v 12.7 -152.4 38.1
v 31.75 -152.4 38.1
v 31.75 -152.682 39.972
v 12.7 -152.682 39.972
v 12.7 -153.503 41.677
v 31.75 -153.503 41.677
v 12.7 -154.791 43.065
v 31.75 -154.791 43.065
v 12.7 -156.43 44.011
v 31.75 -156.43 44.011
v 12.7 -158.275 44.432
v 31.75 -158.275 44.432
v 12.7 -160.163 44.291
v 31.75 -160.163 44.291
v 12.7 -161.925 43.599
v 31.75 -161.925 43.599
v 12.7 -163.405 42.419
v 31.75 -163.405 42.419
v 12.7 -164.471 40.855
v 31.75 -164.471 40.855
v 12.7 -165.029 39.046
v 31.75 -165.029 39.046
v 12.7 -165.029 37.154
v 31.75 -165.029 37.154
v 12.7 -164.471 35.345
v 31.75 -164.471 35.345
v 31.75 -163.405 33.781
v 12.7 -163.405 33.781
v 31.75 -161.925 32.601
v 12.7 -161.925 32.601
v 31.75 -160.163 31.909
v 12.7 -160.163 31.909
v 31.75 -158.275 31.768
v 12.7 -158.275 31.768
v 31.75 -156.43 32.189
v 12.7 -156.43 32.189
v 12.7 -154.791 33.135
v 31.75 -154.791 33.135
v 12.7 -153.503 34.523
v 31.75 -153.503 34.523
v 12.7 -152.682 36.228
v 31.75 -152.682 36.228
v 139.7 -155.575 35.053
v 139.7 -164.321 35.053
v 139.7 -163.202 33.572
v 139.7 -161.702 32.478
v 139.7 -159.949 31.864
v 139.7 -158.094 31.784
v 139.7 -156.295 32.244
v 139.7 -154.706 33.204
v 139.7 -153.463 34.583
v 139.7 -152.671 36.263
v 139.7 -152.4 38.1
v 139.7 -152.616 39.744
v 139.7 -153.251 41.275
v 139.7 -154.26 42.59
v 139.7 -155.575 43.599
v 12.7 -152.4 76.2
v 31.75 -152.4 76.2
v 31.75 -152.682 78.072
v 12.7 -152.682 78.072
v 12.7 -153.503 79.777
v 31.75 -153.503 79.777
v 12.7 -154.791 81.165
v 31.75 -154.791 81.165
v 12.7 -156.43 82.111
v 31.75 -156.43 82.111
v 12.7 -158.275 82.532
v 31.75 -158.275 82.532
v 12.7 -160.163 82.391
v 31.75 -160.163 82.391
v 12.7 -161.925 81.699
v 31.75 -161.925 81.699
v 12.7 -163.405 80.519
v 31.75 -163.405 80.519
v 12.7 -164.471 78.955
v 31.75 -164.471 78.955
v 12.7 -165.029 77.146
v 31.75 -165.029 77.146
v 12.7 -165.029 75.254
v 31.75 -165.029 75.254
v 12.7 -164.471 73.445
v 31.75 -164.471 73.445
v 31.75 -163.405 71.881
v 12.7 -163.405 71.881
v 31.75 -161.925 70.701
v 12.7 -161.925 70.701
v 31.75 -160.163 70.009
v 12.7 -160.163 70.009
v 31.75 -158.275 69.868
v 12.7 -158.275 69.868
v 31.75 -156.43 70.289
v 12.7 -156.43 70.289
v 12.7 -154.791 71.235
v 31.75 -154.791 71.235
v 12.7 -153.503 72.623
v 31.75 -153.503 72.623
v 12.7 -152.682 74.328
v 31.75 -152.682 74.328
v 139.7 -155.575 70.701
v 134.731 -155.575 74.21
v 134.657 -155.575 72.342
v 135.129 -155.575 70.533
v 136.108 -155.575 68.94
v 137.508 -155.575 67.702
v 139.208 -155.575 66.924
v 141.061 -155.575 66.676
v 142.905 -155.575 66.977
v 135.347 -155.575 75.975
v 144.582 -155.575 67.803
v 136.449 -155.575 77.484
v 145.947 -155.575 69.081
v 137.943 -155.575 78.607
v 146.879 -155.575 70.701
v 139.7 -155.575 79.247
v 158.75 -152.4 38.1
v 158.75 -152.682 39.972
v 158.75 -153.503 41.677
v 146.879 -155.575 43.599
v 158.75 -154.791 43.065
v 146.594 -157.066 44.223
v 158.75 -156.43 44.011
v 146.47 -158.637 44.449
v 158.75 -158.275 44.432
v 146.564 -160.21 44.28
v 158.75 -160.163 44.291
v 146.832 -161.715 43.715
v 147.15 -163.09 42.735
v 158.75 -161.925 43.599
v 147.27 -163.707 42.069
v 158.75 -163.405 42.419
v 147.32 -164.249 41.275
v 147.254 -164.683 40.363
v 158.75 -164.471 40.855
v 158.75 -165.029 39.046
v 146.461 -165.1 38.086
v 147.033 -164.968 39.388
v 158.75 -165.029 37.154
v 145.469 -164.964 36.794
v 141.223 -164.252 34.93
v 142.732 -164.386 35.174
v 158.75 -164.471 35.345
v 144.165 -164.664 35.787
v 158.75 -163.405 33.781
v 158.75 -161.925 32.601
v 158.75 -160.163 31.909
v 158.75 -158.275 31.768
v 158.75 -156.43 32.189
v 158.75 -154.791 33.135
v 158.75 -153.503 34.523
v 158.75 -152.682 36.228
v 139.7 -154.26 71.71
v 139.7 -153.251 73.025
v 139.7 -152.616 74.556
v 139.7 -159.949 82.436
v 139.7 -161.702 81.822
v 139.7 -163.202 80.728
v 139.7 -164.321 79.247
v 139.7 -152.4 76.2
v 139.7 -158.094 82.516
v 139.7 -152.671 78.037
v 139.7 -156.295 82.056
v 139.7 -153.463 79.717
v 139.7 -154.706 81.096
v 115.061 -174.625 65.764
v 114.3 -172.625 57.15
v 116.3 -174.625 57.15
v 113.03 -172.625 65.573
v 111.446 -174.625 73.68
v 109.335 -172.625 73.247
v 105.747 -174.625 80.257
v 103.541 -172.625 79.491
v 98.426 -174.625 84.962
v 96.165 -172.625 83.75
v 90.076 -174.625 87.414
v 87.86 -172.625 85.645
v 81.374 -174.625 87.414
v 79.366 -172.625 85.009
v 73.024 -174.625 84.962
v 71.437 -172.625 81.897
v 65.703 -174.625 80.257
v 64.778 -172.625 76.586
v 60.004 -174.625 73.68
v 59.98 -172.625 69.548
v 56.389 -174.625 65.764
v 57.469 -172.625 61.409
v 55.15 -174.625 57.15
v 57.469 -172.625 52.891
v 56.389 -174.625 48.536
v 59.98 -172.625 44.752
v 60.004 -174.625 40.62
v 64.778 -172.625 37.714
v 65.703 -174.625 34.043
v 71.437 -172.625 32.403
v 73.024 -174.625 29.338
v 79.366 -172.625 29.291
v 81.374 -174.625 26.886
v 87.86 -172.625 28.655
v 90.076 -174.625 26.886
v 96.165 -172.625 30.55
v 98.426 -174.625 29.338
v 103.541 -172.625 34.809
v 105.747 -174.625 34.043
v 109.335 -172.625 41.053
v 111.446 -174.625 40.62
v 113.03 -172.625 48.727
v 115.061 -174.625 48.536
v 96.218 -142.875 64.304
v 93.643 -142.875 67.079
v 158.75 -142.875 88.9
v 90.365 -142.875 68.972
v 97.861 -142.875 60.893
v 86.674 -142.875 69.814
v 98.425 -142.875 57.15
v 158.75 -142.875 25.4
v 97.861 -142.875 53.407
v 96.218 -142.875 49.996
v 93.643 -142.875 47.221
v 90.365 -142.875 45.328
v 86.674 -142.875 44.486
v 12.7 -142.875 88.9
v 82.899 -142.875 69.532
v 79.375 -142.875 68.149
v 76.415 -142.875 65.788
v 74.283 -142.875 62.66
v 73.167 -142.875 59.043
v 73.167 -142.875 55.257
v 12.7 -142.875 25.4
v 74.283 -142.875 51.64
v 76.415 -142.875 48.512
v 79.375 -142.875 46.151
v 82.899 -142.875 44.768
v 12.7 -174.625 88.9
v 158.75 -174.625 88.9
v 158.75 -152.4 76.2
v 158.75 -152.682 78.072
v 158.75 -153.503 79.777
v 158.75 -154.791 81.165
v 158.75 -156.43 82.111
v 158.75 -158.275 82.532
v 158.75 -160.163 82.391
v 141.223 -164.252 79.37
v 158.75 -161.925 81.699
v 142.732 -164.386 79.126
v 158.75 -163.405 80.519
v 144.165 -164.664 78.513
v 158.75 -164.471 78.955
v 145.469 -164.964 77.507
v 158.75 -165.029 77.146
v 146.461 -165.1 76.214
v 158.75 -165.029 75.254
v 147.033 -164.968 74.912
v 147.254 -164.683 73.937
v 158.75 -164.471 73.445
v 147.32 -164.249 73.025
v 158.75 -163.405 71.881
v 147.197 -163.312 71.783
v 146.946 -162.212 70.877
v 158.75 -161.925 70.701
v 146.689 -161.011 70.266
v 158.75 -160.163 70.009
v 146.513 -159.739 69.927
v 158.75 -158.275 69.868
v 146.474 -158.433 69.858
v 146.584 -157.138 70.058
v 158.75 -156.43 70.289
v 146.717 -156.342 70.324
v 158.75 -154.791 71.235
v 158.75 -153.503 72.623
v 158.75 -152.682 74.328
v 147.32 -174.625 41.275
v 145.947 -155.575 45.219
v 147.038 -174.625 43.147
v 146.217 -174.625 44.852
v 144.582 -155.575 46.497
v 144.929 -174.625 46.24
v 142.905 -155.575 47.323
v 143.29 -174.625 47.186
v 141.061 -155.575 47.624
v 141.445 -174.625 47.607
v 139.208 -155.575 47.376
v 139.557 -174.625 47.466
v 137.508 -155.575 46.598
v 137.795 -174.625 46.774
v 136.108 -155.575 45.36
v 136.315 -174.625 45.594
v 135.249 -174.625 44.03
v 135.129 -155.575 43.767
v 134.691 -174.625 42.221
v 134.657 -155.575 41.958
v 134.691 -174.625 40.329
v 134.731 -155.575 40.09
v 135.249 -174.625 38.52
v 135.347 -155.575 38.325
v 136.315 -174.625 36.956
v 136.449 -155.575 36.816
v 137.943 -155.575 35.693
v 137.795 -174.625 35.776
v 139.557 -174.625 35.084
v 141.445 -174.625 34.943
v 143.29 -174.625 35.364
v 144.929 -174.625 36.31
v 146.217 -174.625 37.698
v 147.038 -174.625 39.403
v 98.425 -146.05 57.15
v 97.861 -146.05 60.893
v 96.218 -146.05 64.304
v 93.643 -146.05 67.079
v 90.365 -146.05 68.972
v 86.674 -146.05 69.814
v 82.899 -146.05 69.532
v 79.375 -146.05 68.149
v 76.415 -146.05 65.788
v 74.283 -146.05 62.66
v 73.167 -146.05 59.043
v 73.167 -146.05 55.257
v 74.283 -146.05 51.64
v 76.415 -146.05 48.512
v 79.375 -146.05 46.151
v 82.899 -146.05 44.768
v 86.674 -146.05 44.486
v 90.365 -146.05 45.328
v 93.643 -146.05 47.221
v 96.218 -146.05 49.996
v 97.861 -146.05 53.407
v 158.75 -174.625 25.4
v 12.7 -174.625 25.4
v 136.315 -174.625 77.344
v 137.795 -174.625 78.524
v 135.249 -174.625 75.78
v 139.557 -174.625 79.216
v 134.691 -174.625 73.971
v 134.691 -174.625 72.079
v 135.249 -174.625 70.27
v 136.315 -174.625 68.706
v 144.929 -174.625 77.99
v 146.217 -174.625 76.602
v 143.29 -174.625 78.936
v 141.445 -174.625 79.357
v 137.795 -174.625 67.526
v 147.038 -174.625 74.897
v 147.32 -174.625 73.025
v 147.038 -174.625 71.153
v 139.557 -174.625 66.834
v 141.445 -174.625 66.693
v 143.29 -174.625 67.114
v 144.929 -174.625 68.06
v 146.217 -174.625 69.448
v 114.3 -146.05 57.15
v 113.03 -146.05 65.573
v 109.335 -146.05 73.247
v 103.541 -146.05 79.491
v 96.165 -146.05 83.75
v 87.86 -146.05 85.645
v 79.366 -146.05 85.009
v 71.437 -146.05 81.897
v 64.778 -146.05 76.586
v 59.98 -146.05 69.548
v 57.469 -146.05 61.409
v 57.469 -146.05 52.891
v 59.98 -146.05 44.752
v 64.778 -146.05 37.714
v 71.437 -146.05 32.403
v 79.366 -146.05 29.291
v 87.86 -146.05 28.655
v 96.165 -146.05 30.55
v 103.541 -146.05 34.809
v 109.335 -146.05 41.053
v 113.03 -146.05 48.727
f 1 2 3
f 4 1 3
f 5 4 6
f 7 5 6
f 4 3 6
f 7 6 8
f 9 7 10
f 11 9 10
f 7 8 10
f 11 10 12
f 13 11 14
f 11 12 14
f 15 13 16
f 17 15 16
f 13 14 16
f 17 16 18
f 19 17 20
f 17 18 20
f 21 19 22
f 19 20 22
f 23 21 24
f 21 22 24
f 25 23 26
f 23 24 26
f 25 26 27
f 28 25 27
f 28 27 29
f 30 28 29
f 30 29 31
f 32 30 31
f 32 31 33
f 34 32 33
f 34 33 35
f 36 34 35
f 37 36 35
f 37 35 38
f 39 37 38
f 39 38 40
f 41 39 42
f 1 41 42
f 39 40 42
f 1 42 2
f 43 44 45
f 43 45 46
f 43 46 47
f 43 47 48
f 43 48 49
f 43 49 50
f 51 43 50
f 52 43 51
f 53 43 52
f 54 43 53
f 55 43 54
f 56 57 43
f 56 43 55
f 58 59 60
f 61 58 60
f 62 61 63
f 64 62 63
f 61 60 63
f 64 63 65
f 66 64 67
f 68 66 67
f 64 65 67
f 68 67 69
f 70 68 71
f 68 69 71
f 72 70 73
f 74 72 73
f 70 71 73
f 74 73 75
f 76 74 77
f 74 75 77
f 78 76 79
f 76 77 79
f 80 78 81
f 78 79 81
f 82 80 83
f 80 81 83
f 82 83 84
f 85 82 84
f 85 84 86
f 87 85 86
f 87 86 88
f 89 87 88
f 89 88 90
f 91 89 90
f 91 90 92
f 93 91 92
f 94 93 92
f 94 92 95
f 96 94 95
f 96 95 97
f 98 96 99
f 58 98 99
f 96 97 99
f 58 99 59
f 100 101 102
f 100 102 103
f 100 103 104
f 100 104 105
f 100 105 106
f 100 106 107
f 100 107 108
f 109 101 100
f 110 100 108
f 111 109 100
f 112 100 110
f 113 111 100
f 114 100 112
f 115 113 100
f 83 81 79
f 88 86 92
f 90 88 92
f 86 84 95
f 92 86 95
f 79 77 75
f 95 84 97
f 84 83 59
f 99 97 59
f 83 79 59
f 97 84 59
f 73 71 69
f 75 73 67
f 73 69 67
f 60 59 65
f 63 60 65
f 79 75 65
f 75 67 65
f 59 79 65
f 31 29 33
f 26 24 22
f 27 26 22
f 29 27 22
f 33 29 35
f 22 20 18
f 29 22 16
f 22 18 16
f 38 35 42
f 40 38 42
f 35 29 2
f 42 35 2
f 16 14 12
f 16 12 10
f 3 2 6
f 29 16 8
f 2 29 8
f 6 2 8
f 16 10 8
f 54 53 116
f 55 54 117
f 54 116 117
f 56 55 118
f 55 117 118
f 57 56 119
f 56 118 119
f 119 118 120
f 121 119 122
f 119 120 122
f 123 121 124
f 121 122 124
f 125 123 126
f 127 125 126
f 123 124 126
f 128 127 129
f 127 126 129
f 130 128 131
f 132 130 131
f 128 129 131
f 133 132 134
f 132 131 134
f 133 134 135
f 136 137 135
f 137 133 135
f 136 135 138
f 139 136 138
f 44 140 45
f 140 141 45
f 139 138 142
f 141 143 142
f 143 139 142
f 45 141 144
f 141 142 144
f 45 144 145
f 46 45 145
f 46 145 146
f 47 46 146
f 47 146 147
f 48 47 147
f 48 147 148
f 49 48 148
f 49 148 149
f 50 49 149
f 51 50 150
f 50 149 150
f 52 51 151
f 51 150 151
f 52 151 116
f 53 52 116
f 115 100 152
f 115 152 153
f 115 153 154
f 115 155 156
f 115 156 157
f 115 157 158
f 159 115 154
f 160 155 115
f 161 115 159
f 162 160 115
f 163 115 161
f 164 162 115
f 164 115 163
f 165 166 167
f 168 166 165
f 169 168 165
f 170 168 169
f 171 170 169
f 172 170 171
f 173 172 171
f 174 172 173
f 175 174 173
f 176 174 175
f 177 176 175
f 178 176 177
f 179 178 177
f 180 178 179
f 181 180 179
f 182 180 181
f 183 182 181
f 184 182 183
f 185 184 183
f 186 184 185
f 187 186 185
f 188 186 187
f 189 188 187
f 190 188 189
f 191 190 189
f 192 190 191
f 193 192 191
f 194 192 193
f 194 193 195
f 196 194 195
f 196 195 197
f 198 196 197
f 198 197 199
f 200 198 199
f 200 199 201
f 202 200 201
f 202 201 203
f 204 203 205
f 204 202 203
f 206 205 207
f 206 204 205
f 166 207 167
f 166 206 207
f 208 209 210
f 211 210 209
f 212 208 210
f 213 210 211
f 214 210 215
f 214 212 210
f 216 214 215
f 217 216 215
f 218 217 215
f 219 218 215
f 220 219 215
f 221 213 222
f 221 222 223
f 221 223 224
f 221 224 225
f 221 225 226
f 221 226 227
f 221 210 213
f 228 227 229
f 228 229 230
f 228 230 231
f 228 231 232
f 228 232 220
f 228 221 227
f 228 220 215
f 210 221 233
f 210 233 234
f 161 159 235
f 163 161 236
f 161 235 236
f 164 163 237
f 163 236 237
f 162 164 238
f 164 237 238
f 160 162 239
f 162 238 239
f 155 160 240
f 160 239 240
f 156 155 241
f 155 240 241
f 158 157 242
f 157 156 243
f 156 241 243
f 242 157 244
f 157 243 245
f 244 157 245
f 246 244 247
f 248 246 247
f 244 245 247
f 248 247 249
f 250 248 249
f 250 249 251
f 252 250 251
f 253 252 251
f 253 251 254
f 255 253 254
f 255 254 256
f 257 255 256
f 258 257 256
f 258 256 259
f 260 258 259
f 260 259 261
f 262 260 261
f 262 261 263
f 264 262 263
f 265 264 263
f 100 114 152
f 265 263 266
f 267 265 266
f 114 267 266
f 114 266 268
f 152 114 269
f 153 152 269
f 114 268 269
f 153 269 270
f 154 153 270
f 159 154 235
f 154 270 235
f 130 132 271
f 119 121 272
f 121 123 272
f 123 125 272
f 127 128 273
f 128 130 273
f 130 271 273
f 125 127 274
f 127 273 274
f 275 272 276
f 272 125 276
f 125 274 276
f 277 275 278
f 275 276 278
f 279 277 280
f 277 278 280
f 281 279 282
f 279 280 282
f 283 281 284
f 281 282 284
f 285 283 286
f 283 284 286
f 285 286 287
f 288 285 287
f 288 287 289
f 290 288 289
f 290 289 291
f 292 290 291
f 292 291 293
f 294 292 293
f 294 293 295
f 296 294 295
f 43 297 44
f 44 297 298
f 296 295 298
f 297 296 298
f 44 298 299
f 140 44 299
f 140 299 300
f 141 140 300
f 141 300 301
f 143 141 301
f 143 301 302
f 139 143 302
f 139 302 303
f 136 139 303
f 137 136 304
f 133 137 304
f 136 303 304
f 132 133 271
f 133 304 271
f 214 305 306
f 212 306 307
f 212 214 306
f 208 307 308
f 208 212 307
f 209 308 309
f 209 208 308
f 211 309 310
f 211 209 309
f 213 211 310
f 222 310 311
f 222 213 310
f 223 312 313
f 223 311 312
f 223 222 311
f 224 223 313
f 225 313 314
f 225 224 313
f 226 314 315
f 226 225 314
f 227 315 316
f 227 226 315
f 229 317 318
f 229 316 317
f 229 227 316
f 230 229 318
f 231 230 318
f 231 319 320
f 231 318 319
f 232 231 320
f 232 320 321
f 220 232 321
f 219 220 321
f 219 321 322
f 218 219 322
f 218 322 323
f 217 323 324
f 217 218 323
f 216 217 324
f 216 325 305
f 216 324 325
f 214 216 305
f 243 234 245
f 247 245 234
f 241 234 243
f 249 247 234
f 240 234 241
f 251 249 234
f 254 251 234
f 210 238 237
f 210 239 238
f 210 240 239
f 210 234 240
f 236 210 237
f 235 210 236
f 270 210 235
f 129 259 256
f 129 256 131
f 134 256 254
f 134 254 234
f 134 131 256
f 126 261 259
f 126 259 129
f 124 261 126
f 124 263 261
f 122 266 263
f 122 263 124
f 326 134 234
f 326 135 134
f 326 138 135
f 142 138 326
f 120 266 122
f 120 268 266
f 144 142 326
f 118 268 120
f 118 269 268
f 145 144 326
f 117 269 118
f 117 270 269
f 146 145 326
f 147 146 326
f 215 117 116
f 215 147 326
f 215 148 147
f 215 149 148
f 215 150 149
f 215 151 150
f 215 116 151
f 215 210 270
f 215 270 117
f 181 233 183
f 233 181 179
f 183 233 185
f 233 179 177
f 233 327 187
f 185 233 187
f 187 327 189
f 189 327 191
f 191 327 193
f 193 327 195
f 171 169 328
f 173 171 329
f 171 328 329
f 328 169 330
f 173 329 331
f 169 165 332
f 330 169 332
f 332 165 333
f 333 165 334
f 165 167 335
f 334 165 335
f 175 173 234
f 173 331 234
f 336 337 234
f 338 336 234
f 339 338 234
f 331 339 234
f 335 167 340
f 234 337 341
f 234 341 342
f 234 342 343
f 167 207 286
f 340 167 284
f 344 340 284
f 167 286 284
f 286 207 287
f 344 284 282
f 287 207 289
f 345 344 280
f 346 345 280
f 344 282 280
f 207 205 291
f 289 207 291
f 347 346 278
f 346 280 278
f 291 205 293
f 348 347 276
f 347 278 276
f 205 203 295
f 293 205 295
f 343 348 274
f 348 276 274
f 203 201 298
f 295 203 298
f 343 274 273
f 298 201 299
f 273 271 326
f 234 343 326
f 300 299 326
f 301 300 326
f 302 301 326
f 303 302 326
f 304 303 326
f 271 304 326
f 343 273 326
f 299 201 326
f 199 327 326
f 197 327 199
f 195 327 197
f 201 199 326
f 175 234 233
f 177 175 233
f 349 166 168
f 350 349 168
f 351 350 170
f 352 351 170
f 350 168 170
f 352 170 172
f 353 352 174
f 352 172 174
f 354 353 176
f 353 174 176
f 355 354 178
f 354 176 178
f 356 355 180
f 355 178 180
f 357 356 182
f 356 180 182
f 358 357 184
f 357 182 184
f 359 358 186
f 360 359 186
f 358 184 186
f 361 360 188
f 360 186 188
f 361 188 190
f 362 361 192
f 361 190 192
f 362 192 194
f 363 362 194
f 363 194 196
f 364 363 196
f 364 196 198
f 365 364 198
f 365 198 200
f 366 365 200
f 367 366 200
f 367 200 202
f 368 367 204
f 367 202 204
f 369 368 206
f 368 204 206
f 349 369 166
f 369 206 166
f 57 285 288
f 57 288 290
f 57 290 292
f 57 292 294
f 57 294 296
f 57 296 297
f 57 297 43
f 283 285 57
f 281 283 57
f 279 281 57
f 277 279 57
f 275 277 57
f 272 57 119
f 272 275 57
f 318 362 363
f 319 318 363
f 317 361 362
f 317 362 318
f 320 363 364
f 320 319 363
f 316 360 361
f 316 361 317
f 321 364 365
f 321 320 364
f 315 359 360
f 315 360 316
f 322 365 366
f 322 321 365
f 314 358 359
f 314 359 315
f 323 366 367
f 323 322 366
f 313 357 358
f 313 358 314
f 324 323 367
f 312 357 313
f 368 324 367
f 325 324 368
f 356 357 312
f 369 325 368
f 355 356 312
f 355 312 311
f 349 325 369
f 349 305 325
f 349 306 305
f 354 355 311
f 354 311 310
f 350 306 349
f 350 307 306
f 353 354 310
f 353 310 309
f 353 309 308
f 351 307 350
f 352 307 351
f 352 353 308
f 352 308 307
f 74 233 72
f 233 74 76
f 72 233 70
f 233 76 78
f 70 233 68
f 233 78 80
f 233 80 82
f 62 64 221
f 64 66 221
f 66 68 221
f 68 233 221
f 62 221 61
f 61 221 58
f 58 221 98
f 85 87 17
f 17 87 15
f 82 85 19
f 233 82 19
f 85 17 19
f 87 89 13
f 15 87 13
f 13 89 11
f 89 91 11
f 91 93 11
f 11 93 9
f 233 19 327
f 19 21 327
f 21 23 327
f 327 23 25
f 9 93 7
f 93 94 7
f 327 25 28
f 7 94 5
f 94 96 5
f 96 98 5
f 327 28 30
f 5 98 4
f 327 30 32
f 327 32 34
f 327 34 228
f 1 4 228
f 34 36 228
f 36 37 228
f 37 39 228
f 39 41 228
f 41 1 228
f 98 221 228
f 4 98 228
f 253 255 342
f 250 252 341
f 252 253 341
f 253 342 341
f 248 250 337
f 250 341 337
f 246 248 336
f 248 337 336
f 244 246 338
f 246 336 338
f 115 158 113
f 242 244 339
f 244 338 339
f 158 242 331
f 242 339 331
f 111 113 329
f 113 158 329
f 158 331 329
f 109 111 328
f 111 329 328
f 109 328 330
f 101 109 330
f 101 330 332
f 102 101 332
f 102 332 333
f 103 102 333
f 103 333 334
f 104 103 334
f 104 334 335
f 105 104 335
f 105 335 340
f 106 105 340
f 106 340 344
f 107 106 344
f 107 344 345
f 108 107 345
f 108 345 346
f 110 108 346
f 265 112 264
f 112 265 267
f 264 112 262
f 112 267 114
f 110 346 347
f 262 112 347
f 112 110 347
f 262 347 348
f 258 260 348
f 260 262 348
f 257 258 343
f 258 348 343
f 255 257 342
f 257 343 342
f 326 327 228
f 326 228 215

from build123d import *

# Parameters (mm, degrees)
BOSS_EXTRUDE1_DEPTH      = 88.9
CUT_EXTRUDE2_DEPTH       = 241.232341963
CUT_EXTRUDE2_DEPTH_BACK  = 241.232341963
SKETCH3_R                = 28.575
CUT_EXTRUDE5_DEPTH       = 28.575
CUT_EXTRUDE6_DEPTH       = 243.134084755
CUT_EXTRUDE6_DEPTH_BACK  = 243.134084755
SKETCH4_R                = 12.7
CUT_EXTRUDE7_DEPTH       = 261.369359036
CUT_EXTRUDE7_DEPTH_BACK  = 261.369359036
CUT_EXTRUDE8_DEPTH       = 261.369359036
CUT_EXTRUDE8_DEPTH_BACK  = 12.7
SKETCH6_R                = 9.525
SKETCH7_R                = 6.35
CUT_EXTRUDE9_DEPTH       = 12.7
SKETCH12_R               = 12.7
CUT_EXTRUDE13_DEPTH      = 3.175
CUT_EXTRUDE14_DEPTH      = 253.187753717
CUT_EXTRUDE14_DEPTH_BACK = 253.187753717
SKETCH14_R               = 1.5875
CUT_EXTRUDE15_START      = -12.7
CUT_EXTRUDE15_DEPTH      = 12.7
CUT_EXTRUDE16_START      = -12.7
SKETCH8_4_R              = 6.35
CUT_EXTRUDE16_DEPTH      = 19.05
CUT_EXTRUDE18_START      = -171.45
CUT_EXTRUDE18_DEPTH      = 12.7
CUT_EXTRUDE19_START      = -139.7
SKETCH8_10_R             = 6.35
CUT_EXTRUDE19_DEPTH      = 19.05
SKETCH15_R               = 6.35
CUT_EXTRUDE20_DEPTH      = 19.05
CHAMFER1_SIZE            = 2


with BuildPart() as part:
    # Sketch1 → Boss-Extrude1 (new body)
    with BuildSketch(Plane.XY):
        Polygon((0, 0), (0, -174.625), (171.45, -174.625), (171.45, 0), (158.75, 0), (158.75, -142.875), (12.7, -142.875), (12.7, 0), align=None)
    extrude(amount=BOSS_EXTRUDE1_DEPTH)

    # Sketch2 → Cut-Extrude2 (cut, two sides: drawn at the far end of the back side and taken through both)
    with BuildSketch(Plane(origin=(0, -142.875, 0), x_dir=(1, 0, 0), z_dir=(0, 1, 0)).offset(-CUT_EXTRUDE2_DEPTH_BACK)):
        Polygon((158.75, 0), (12.7, 0), (12.7, -25.4), (85.724999876, -25.4), (158.75, -25.4), align=None)
    extrude(amount=CUT_EXTRUDE2_DEPTH + CUT_EXTRUDE2_DEPTH_BACK, mode=Mode.SUBTRACT)

    # Sketch3 → Cut-Extrude5 (cut)
    with BuildSketch(Plane.XZ.offset(174.625)):
        with Locations((85.725, 57.15)):
            Circle(SKETCH3_R)
    extrude(amount=-CUT_EXTRUDE5_DEPTH, mode=Mode.SUBTRACT)

    # Sketch4 → Cut-Extrude6 (cut, two sides: drawn at the far end of the back side and taken through both)
    with BuildSketch(Plane.XZ.offset(146.05).offset(-CUT_EXTRUDE6_DEPTH_BACK)):
        with Locations((85.725, 57.15)):
            Circle(SKETCH4_R)
    extrude(amount=CUT_EXTRUDE6_DEPTH + CUT_EXTRUDE6_DEPTH_BACK, mode=Mode.SUBTRACT)

    # Sketch5 → Cut-Extrude7 (cut, two sides: drawn at the far end of the back side and taken through both)
    with BuildSketch(Plane(origin=(171.45, 0, 0), x_dir=(0, 0, -1), z_dir=(1, 0, 0)).offset(-CUT_EXTRUDE7_DEPTH_BACK)):
        with BuildLine():
            Line((0, -174.625), (0, -114.3))
            ThreePointArc((0, -114.3), (-0.597344099, -119.776153781), (-2.361280333, -124.994736842))
            Line((-2.361280333, -124.994736842), (-25.4, -174.625))
            Line((-25.4, -174.625), (0, -174.625))
        make_face()
        with BuildLine():
            Line((-39.269490456, -98.025866748), (-71.745289975, -22.119448379))
            ThreePointArc((-71.745289975, -22.119448379), (-70.400400796, -7.131859618), (-57.149999966, 0))
            Line((-57.149999966, 0), (-88.9, 0))
            Line((-88.9, 0), (-88.9, -142.875))
            Line((-88.9, -142.875), (-50.8, -142.875))
            Line((-50.8, -142.875), (-39.583234749, -118.711720996))
            ThreePointArc((-39.583234749, -118.711720996), (-37.224875429, -108.402184034), (-39.269490456, -98.025866748))
        make_face()
        with BuildLine():
            Line((0, 0), (-57.149999966, 0))
            ThreePointArc((-57.149999966, 0), (-48.406859618, -2.624599204), (-42.554710025, -9.630551621))
            Line((-42.554710025, -9.630551621), (-2.047536041, -104.308882594))
            ThreePointArc((-2.047536041, -104.308882594), (-0.51714863, -109.200616928), (0, -114.3))
            Line((0, -114.3), (0, 0))
        make_face()
    extrude(amount=CUT_EXTRUDE7_DEPTH + CUT_EXTRUDE7_DEPTH_BACK, mode=Mode.SUBTRACT)

    # Sketch6 → Cut-Extrude8 (cut, two sides: drawn at the far end of the back side and taken through both)
    with BuildSketch(Plane(origin=(171.45, 0, 0), x_dir=(0, 0, -1), z_dir=(1, 0, 0)).offset(-CUT_EXTRUDE8_DEPTH_BACK)):
        with Locations(Location((-57.15, -15.875, 0), (0, 0, 90))):
            Circle(SKETCH6_R)
    extrude(amount=CUT_EXTRUDE8_DEPTH + CUT_EXTRUDE8_DEPTH_BACK, mode=Mode.SUBTRACT)

    # Sketch7 → Cut-Extrude9 (cut)
    with BuildSketch(Plane(origin=(12.7, 0, 0), x_dir=(0, 0, -1), z_dir=(1, 0, 0))):
        with Locations((-57.15, -15.875)):
            Circle(SKETCH7_R)
    extrude(amount=-CUT_EXTRUDE9_DEPTH, mode=Mode.SUBTRACT)

    # Sketch12 → Cut-Extrude13 (cut)
    with BuildSketch(Plane(origin=(12.7, 0, 0), x_dir=(0, 0, -1), z_dir=(1, 0, 0))):
        with Locations((-57.15, -15.875)):
            Circle(SKETCH12_R)
    extrude(amount=-CUT_EXTRUDE13_DEPTH, mode=Mode.SUBTRACT)

    # Sketch14 → Cut-Extrude14 (cut, two sides: drawn at the far end of the back side and taken through both)
    with BuildSketch(Plane(origin=(12.7, 0, 0), x_dir=(0, 0, -1), z_dir=(1, 0, 0)).offset(-CUT_EXTRUDE14_DEPTH_BACK)):
        with Locations((-53.770765225, -24.780413934)):
            Circle(SKETCH14_R)
        with Locations((-66.551932086, -14.348796194)):
            Circle(SKETCH14_R)
        with Locations((-51.12730269, -8.495789872)):
            Circle(SKETCH14_R)
    extrude(amount=CUT_EXTRUDE14_DEPTH + CUT_EXTRUDE14_DEPTH_BACK, mode=Mode.SUBTRACT)

    # Sketch8 → Cut-Extrude15 (cut)
    with BuildSketch(Plane(origin=(171.45, 0, 0), x_dir=(0, 0, -1), z_dir=(1, 0, 0)).offset(CUT_EXTRUDE15_START)):
        with BuildLine():
            Line((-50.8, -142.875), (-88.9, -142.875))
            Line((-88.9, -142.875), (-88.9, -174.625))
            Line((-88.9, -174.625), (-25.4, -174.625))
            Line((-25.4, -174.625), (-2.361280333, -124.994736842))
            ThreePointArc((-2.361280333, -124.994736842), (-0.002921013, -114.68519988), (-2.047536041, -104.308882594))
            Line((-2.047536041, -104.308882594), (-42.554710025, -9.630551621))
            ThreePointArc((-42.554710025, -9.630551621), (-63.394448379, -1.279710025), (-71.745289975, -22.119448379))
            Line((-71.745289975, -22.119448379), (-39.269490456, -98.025866748))
            ThreePointArc((-39.269490456, -98.025866748), (-37.224875429, -108.402184034), (-39.583234749, -118.711720996))
            Line((-39.583234749, -118.711720996), (-50.8, -142.875))
        make_face()
    extrude(amount=CUT_EXTRUDE15_DEPTH, mode=Mode.SUBTRACT)

    # Sketch8<4> → Cut-Extrude16 (cut)
    with BuildSketch(Plane(origin=(171.45, 0, 0), x_dir=(0, 0, -1), z_dir=(1, 0, 0)).offset(CUT_EXTRUDE16_START)):
        with Locations(Location((-76.2, -158.75, 0), (0, 0, 90))):
            Circle(SKETCH8_4_R)
        with Locations(Location((-38.1, -158.75, 0), (0, 0, 90))):
            Circle(SKETCH8_4_R)
    extrude(amount=-CUT_EXTRUDE16_DEPTH, mode=Mode.SUBTRACT)

    # Sketch8<9> → Cut-Extrude18 (cut)
    with BuildSketch(Plane(origin=(171.45, 0, 0), x_dir=(0, 0, -1), z_dir=(1, 0, 0)).offset(CUT_EXTRUDE18_START)):
        with BuildLine():
            Line((-50.8, -142.875), (-88.9, -142.875))
            Line((-88.9, -142.875), (-88.9, -174.625))
            Line((-88.9, -174.625), (-25.4, -174.625))
            Line((-25.4, -174.625), (-2.361280333, -124.994736842))
            ThreePointArc((-2.361280333, -124.994736842), (-0.002921013, -114.68519988), (-2.047536041, -104.308882594))
            Line((-2.047536041, -104.308882594), (-42.554710025, -9.630551621))
            ThreePointArc((-42.554710025, -9.630551621), (-63.394448379, -1.279710025), (-71.745289975, -22.119448379))
            Line((-71.745289975, -22.119448379), (-39.269490456, -98.025866748))
            ThreePointArc((-39.269490456, -98.025866748), (-37.224875429, -108.402184034), (-39.583234749, -118.711720996))
            Line((-39.583234749, -118.711720996), (-50.8, -142.875))
        make_face()
    extrude(amount=CUT_EXTRUDE18_DEPTH, mode=Mode.SUBTRACT)

    # Sketch8<10> → Cut-Extrude19 (cut)
    with BuildSketch(Plane(origin=(171.45, 0, 0), x_dir=(0, 0, -1), z_dir=(1, 0, 0)).offset(CUT_EXTRUDE19_START)):
        with Locations(Location((-76.2, -158.75, 0), (0, 0, 90))):
            Circle(SKETCH8_10_R)
        with Locations(Location((-38.1, -158.75, 0), (0, 0, 90))):
            Circle(SKETCH8_10_R)
    extrude(amount=-CUT_EXTRUDE19_DEPTH, mode=Mode.SUBTRACT)

    # Sketch15 → Cut-Extrude20 (cut)
    with BuildSketch(Plane.XZ.offset(174.625)):
        with Locations((140.97, 73.025)):
            Circle(SKETCH15_R)
        with Locations((140.97, 41.275)):
            Circle(SKETCH15_R)
    extrude(amount=-CUT_EXTRUDE20_DEPTH, mode=Mode.SUBTRACT)

    # Chamfer1
    chamfer1_edges = [part.edges().sort_by_distance(p)[0] for p in [
        (57.15, -174.625, 57.15),
    ]]
    chamfer(chamfer1_edges, length=CHAMFER1_SIZE)


solid = part.part
